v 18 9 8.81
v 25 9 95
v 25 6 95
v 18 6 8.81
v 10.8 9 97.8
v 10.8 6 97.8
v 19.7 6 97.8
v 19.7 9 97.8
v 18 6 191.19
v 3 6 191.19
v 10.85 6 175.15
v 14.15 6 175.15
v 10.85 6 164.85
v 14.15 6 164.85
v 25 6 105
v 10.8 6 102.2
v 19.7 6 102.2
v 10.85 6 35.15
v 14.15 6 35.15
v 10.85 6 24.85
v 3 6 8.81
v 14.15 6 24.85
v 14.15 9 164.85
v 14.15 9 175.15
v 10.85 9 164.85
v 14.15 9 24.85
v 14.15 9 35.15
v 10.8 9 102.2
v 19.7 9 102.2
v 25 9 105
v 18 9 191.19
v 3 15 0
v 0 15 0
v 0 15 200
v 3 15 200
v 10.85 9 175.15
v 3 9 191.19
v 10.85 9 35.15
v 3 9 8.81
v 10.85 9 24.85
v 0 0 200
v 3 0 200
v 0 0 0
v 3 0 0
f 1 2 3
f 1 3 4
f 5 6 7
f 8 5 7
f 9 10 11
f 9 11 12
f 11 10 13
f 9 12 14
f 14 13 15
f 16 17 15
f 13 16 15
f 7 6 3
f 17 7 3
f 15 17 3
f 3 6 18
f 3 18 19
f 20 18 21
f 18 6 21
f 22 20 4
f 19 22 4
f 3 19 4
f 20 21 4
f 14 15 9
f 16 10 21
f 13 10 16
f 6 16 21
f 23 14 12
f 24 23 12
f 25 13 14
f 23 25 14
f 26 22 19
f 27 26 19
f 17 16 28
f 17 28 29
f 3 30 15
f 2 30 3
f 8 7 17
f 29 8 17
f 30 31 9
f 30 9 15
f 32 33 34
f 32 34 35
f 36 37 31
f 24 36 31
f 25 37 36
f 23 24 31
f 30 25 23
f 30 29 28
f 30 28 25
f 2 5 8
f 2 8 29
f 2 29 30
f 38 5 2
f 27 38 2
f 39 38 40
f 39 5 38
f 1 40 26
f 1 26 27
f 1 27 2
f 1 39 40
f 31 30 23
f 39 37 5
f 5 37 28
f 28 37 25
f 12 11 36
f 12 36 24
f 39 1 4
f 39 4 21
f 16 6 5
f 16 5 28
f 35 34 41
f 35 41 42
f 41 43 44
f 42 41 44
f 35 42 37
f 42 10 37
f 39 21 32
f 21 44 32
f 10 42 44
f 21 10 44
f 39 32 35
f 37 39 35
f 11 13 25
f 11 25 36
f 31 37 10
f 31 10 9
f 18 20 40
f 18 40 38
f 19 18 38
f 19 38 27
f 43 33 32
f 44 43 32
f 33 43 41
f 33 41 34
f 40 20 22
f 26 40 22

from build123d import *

# Parameters (mm, degrees)
SKETCH_1_W          = 3
SKETCH_1_H          = 15
EXTRUDE_1_DEPTH     = 200
EXTRUDE_7_DEPTH     = 3
SKETCH_13_W         = 3.3
SKETCH_13_H         = 10.3
SKETCH_13_W_2       = 8.9
SKETCH_13_H_2       = 4.4
CUT_EXTRUDE_1_DEPTH = 10


with BuildPart() as part:
    # 草图1 → 凸台-拉伸1 (new body)
    with BuildSketch(Plane.XY):
        with Locations((1.5, 7.5)):
            Rectangle(SKETCH_1_W, SKETCH_1_H)
    extrude(amount=EXTRUDE_1_DEPTH)

    # 草图12 → 凸台-拉伸7 (add)
    with BuildSketch(Plane(origin=(0, 9, 0), x_dir=(1, 0, 0), z_dir=(0, 1, 0))):
        Polygon((18, -191.190016229), (25, -105), (25, -95), (18, -8.809983771), (3, -8.809983771), (3, -191.190016229), align=None)
    extrude(amount=-EXTRUDE_7_DEPTH)

    # 草图13 → 切除-拉伸1 (cut)
    with BuildSketch(Plane.XZ.offset(-6)):
        with Locations((12.5, 29.999983771)):
            Rectangle(SKETCH_13_W, SKETCH_13_H)
        with Locations((12.5, 169.999983771)):
            Rectangle(SKETCH_13_W, SKETCH_13_H)
        with Locations((15.25, 99.999983771)):
            Rectangle(SKETCH_13_W_2, SKETCH_13_H_2)
    extrude(amount=-CUT_EXTRUDE_1_DEPTH, mode=Mode.SUBTRACT)


solid = part.part
